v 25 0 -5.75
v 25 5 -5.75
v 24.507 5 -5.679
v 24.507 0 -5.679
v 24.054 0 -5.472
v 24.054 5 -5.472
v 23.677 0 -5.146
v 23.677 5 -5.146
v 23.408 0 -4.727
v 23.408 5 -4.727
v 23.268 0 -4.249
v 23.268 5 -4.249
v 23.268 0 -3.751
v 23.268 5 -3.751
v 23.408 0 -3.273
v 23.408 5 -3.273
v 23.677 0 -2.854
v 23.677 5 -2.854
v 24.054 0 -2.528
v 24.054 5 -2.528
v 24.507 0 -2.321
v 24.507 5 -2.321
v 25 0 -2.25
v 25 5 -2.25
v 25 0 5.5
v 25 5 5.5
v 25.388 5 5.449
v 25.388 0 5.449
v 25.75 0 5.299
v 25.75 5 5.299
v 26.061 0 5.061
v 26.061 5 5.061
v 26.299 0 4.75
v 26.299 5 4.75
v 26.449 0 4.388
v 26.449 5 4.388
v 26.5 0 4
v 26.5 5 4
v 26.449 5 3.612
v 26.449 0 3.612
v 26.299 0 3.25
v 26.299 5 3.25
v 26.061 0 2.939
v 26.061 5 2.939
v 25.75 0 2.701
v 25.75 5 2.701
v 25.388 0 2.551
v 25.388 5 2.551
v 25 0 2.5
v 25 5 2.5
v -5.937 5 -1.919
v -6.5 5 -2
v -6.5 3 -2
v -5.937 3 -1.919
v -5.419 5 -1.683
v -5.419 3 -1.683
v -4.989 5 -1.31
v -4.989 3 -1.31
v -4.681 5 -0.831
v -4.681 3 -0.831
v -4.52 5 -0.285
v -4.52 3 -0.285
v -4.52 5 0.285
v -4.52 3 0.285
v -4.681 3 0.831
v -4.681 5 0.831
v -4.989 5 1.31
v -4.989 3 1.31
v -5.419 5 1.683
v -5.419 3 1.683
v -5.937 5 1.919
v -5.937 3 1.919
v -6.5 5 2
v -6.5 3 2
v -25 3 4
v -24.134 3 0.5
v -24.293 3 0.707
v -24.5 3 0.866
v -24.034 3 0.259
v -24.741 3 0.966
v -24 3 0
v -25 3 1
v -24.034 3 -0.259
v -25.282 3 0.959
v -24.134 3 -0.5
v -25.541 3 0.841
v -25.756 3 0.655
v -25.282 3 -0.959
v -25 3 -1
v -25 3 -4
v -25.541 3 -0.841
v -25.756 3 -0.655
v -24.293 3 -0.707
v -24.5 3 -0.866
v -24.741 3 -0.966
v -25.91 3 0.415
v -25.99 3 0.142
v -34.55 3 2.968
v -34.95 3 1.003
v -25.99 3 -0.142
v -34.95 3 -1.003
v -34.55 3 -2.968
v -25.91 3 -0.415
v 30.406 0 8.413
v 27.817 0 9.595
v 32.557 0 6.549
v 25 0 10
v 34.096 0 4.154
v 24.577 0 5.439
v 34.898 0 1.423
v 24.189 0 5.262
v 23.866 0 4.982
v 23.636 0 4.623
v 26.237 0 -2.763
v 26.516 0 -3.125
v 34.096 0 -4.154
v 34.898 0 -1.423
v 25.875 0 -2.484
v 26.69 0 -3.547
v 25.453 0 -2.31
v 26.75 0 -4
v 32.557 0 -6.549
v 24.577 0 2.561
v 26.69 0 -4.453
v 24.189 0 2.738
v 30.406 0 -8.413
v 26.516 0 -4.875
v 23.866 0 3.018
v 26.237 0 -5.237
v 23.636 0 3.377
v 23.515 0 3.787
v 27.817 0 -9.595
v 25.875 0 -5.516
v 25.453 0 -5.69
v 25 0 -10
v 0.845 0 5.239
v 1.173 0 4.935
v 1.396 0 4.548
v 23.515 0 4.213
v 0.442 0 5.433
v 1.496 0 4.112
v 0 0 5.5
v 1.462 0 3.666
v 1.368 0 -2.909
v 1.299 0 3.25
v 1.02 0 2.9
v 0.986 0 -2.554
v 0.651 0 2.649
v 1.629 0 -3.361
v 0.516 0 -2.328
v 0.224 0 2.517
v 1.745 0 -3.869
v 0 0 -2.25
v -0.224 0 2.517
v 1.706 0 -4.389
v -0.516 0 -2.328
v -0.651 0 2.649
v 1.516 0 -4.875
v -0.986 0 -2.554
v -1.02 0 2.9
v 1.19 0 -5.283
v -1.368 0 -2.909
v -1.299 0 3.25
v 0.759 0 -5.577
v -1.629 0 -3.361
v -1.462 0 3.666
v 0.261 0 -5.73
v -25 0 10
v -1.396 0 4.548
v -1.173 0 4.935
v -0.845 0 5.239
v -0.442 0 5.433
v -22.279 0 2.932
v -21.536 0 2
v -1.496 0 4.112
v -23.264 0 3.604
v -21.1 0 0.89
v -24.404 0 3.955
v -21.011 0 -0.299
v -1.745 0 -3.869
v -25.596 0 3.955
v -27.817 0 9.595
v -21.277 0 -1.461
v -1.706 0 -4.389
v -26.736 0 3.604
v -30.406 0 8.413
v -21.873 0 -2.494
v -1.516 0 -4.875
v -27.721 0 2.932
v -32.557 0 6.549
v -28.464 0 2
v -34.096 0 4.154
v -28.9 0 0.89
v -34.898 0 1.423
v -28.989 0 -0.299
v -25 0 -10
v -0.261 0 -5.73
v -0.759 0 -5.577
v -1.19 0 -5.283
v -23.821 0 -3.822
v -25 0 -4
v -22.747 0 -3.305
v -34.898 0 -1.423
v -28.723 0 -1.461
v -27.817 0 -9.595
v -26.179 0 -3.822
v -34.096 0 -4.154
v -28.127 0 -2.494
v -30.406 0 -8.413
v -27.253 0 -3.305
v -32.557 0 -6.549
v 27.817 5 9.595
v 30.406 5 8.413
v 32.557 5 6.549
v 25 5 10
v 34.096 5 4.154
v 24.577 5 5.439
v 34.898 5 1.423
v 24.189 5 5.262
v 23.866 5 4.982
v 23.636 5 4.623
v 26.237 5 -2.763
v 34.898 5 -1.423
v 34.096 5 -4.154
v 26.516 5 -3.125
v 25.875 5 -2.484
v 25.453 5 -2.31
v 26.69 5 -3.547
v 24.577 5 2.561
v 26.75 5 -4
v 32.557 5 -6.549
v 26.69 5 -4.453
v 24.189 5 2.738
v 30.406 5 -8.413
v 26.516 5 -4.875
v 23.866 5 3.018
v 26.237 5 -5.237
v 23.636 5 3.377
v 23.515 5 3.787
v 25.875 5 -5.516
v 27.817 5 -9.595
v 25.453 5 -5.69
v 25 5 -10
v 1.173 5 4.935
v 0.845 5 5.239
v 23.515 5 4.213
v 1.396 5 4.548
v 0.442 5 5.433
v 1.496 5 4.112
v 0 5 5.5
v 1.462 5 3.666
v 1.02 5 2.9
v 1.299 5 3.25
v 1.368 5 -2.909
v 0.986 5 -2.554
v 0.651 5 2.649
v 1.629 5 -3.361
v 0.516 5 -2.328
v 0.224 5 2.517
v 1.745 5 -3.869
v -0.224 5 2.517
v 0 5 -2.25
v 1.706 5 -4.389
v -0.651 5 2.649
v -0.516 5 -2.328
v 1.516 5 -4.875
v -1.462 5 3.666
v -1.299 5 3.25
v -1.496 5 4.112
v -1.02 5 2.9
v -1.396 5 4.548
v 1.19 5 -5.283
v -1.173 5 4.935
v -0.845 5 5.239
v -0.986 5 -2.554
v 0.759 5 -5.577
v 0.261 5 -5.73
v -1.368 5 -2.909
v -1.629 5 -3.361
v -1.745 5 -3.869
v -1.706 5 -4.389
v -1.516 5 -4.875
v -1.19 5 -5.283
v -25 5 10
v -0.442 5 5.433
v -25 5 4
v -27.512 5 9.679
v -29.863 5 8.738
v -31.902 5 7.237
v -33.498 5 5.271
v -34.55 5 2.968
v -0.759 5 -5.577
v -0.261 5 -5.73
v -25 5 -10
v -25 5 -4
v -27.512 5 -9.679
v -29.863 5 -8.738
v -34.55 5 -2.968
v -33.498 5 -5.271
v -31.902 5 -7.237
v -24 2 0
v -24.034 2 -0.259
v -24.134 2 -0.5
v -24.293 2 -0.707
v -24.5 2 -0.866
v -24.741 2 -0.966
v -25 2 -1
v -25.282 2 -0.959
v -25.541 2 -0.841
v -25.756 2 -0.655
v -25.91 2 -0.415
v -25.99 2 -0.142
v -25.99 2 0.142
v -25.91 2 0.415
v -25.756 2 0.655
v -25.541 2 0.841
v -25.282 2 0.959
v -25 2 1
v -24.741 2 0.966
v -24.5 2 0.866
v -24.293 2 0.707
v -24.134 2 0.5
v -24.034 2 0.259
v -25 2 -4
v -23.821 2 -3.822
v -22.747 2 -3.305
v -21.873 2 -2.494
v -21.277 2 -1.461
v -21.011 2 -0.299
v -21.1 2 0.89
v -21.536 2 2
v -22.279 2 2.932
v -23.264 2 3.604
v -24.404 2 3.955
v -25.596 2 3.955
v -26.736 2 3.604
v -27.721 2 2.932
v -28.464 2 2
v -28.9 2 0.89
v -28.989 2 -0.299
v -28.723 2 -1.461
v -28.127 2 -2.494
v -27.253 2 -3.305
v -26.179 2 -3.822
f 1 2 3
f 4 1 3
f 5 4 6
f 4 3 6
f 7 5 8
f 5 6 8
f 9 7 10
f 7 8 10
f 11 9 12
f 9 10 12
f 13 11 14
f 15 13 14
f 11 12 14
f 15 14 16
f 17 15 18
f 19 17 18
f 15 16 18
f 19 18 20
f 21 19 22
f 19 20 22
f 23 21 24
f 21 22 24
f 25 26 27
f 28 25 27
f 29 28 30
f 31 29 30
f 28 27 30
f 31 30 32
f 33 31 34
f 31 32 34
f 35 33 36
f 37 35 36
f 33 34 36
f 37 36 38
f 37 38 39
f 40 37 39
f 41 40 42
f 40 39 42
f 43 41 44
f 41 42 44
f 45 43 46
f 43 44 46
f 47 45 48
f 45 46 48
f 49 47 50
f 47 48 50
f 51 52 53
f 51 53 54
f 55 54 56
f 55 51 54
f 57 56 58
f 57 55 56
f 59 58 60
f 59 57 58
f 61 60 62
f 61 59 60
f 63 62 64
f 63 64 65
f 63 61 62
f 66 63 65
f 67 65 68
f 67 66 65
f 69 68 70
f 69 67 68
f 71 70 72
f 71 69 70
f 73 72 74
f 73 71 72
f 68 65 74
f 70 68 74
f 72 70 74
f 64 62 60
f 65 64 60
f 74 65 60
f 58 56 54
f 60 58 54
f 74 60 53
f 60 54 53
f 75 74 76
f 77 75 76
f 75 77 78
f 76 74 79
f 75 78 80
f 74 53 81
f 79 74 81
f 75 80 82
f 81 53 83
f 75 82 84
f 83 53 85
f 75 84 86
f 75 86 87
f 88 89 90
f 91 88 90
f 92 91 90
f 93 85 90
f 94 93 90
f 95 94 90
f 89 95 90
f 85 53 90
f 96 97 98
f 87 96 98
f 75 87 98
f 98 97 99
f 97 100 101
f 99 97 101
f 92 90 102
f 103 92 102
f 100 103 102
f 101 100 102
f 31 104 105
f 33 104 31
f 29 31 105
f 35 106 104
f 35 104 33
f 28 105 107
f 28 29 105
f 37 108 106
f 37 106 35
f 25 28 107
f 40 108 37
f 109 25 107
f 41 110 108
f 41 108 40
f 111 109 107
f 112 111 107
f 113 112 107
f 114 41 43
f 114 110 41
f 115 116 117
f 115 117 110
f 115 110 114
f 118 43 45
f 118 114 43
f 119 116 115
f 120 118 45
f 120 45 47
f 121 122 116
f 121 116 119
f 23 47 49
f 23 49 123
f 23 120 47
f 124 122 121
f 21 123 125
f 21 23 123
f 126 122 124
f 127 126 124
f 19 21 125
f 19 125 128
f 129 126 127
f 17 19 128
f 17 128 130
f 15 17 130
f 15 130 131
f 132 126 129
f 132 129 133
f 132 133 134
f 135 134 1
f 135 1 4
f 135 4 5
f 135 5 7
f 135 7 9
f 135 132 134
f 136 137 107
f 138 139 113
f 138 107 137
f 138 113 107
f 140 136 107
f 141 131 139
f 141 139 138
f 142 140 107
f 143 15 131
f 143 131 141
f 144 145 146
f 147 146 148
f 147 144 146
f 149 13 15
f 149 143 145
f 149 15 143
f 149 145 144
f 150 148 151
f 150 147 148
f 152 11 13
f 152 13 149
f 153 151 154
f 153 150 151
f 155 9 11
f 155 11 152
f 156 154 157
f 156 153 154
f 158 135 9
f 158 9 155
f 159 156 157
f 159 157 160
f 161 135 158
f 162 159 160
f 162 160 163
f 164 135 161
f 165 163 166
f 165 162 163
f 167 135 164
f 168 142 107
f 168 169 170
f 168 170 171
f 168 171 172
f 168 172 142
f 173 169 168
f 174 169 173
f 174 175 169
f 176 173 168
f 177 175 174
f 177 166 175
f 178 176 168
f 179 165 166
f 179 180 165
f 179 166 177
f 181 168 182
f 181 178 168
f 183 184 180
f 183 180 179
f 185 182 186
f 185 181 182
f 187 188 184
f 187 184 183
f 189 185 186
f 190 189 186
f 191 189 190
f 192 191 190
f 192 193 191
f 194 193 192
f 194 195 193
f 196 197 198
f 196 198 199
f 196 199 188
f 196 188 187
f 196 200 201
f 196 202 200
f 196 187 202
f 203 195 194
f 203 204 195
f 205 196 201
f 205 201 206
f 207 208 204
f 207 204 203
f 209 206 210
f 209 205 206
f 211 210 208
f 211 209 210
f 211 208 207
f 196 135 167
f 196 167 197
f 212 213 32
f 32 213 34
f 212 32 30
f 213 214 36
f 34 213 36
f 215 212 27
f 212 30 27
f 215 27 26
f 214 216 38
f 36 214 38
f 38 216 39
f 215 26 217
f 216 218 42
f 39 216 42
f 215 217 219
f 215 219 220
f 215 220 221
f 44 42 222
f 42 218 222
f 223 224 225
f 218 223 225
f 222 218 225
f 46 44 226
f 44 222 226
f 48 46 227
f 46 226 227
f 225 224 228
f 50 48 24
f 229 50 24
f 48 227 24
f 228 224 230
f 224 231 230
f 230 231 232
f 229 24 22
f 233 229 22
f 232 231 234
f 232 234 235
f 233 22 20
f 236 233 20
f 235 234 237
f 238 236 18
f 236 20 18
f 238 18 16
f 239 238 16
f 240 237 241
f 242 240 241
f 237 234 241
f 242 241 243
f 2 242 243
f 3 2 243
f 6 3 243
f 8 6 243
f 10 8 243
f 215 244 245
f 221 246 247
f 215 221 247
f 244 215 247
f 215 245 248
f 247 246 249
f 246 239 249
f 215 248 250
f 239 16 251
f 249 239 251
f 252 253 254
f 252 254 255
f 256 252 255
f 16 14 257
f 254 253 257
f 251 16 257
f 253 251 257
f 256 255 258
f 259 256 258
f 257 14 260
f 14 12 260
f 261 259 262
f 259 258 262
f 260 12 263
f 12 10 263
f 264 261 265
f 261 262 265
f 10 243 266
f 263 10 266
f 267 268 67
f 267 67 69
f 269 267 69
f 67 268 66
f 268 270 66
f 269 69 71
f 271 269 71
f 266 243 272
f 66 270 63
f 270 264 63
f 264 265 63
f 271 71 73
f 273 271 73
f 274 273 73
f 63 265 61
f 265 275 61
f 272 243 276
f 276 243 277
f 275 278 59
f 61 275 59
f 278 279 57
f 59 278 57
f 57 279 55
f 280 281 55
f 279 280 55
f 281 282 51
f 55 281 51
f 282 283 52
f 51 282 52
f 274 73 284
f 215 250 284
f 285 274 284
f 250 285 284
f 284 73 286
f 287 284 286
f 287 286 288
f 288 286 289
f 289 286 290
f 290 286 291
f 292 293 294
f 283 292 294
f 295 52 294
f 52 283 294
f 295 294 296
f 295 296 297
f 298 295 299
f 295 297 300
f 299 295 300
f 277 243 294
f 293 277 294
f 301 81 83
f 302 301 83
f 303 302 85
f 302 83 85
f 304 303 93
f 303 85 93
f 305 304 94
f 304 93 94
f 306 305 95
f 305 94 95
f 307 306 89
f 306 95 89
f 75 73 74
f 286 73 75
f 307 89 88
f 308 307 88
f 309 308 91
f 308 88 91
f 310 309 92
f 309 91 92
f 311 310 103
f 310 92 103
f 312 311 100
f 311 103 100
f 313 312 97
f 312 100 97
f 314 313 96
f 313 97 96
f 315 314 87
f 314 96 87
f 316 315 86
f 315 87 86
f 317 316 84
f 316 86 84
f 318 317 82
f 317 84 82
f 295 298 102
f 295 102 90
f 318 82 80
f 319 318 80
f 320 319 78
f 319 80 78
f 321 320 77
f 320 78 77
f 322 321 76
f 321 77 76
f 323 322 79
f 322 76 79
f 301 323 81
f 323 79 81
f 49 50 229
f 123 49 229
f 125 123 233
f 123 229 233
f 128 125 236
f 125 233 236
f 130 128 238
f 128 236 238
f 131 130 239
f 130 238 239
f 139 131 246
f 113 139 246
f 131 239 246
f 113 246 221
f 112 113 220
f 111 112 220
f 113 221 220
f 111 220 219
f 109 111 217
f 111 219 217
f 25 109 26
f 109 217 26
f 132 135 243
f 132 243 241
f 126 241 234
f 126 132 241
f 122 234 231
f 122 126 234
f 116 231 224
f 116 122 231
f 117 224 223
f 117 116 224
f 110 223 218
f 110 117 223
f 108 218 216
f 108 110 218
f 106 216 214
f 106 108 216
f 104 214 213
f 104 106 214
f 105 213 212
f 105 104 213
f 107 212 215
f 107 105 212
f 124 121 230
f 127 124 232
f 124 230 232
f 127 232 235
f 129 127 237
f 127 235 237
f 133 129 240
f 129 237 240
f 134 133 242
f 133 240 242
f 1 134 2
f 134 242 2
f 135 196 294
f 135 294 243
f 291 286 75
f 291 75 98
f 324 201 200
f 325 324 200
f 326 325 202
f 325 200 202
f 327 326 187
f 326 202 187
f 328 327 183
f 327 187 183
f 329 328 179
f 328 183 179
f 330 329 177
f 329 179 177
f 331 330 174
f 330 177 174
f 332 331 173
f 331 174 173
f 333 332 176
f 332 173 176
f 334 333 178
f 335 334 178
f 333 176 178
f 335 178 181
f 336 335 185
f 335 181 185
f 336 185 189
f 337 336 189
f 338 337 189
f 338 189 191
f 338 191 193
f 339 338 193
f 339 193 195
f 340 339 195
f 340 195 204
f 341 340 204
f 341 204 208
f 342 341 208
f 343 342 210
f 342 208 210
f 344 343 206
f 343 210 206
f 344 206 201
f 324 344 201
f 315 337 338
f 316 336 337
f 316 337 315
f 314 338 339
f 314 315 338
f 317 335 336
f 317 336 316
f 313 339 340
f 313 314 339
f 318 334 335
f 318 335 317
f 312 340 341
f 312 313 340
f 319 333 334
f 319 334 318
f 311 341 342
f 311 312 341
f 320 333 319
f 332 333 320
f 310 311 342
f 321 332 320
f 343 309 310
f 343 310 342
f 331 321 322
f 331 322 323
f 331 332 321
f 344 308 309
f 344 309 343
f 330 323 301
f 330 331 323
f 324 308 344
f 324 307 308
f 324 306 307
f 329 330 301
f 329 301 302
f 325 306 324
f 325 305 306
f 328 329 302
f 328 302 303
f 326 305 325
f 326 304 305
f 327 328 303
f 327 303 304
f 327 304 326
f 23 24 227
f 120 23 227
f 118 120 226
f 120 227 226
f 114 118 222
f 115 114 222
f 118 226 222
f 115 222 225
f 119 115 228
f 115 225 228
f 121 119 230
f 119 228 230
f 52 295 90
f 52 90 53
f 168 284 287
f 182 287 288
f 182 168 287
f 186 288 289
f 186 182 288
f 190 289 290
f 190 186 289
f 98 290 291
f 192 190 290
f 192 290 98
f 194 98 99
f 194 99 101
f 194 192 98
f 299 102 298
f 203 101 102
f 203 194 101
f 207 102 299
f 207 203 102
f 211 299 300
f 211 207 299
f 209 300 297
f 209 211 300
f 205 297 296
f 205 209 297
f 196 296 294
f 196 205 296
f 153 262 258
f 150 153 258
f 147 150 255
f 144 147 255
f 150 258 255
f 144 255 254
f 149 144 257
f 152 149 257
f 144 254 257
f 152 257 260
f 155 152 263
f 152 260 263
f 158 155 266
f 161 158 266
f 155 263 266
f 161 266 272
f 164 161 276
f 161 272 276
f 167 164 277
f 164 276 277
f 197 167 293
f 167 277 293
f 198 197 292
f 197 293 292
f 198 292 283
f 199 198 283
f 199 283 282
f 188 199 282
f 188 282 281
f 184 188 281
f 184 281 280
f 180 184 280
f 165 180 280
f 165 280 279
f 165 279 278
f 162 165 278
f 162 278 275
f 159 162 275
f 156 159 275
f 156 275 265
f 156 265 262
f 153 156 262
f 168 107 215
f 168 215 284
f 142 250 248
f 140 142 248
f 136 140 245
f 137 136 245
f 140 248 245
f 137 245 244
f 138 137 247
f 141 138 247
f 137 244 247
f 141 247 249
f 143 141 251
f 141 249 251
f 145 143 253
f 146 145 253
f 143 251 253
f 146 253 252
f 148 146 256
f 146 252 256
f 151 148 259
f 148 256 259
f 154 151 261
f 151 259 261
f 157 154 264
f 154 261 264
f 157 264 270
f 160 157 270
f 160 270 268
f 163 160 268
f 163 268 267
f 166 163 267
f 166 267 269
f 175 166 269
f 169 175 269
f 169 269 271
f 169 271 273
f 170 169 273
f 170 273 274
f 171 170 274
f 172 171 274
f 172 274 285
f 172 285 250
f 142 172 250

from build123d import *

# Parameters (mm, degrees)
BOSS_EXTRUDE1_DEPTH = 5
CUT_EXTRUDE4_DEPTH  = 37.742346142
CUT_EXTRUDE5_DEPTH  = 2
SKETCH7_R           = 4
CUT_EXTRUDE6_DEPTH  = 2
CUT_EXTRUDE10_DEPTH = 37.742346142
SKETCH12_R          = 1.75
SKETCH12_R_2        = 1.5
CUT_EXTRUDE11_DEPTH = 37.742346142


with BuildPart() as part:
    # Sketch1 → Boss-Extrude1 (new body)
    with BuildSketch(Plane(origin=(0, 0, 0), x_dir=(1, 0, 0), z_dir=(0, 1, 0))):
        with BuildLine():
            Line((-25, 10), (25, 10))
            ThreePointArc((25, 10), (35, 0), (25, -10))
            Line((25, -10), (-25, -10))
            ThreePointArc((-25, -10), (-35, 0), (-25, 10))
        make_face()
    extrude(amount=BOSS_EXTRUDE1_DEPTH)

    # Sketch5 → Cut-Extrude4 (cut, through all)
    with BuildSketch(Plane(origin=(0, 5, 0), x_dir=(1, 0, 0), z_dir=(0, 1, 0))):
        with BuildLine():
            ThreePointArc((-24, 0), (-24.292893219, 0.707106781), (-25, 1))
            Line((-25, 1), (-25, -1))
            ThreePointArc((-25, -1), (-24.292893219, -0.707106781), (-24, 0))
        make_face()
        with BuildLine():
            Line((-25, -1), (-25, 1))
            ThreePointArc((-25, 1), (-26, 0), (-25, -1))
        make_face()
    extrude(amount=-CUT_EXTRUDE4_DEPTH, mode=Mode.SUBTRACT)

    # Sketch6 → Cut-Extrude5 (cut)
    with BuildSketch(Plane(origin=(0, 5, 0), x_dir=(1, 0, 0), z_dir=(0, 1, 0))):
        with BuildLine():
            Line((-43.5, 2), (-25, 4))
            Line((-25, 4), (-6.5, 2))
            ThreePointArc((-6.5, 2), (-4.5, 0), (-6.5, -2))
            Line((-6.5, -2), (-25, -4))
            Line((-25, -4), (-43.5, -2))
            ThreePointArc((-43.5, -2), (-45.5, 0), (-43.5, 2))
        make_face()
    extrude(amount=-CUT_EXTRUDE5_DEPTH, mode=Mode.SUBTRACT)

    # Sketch7 → Cut-Extrude6 (cut)
    with BuildSketch(Plane.XZ):
        with Locations(Location((-25, 0, 0), (0, 0, 270))):
            Circle(SKETCH7_R)
    extrude(amount=-CUT_EXTRUDE6_DEPTH, mode=Mode.SUBTRACT)

    # Sketch11 → Cut-Extrude10 (cut, through all)
    with BuildSketch(Plane(origin=(0, 5, 0), x_dir=(1, 0, 0), z_dir=(0, 1, 0))):
        with BuildLine():
            ThreePointArc((26.75, 4), (26.237436867, 5.237436867), (25, 5.75))
            Line((25, 5.75), (25, 2.25))
            ThreePointArc((25, 2.25), (26.237436867, 2.762563133), (26.75, 4))
        make_face()
        with BuildLine():
            Line((25, 2.25), (25, 5.75))
            ThreePointArc((25, 5.75), (23.25, 4), (25, 2.25))
        make_face()
        with BuildLine():
            ThreePointArc((26.5, -4), (26.060660172, -2.939339828), (25, -2.5))
            Line((25, -2.5), (25, -5.5))
            ThreePointArc((25, -5.5), (26.060660172, -5.060660172), (26.5, -4))
        make_face()
        with BuildLine():
            Line((25, -5.5), (25, -2.5))
            ThreePointArc((25, -2.5), (23.5, -4), (25, -5.5))
        make_face()
    extrude(amount=-CUT_EXTRUDE10_DEPTH, mode=Mode.SUBTRACT)

    # Sketch12 → Cut-Extrude11 (cut, through all)
    with BuildSketch(Plane(origin=(0, 5, 0), x_dir=(1, 0, 0), z_dir=(0, 1, 0))):
        with Locations(Location((0, 4, 0), (0, 0, 270))):
            Circle(SKETCH12_R)
        with Locations(Location((0, -4, 0), (0, 0, 270))):
            Circle(SKETCH12_R_2)
    extrude(amount=-CUT_EXTRUDE11_DEPTH, mode=Mode.SUBTRACT)


solid = part.part
